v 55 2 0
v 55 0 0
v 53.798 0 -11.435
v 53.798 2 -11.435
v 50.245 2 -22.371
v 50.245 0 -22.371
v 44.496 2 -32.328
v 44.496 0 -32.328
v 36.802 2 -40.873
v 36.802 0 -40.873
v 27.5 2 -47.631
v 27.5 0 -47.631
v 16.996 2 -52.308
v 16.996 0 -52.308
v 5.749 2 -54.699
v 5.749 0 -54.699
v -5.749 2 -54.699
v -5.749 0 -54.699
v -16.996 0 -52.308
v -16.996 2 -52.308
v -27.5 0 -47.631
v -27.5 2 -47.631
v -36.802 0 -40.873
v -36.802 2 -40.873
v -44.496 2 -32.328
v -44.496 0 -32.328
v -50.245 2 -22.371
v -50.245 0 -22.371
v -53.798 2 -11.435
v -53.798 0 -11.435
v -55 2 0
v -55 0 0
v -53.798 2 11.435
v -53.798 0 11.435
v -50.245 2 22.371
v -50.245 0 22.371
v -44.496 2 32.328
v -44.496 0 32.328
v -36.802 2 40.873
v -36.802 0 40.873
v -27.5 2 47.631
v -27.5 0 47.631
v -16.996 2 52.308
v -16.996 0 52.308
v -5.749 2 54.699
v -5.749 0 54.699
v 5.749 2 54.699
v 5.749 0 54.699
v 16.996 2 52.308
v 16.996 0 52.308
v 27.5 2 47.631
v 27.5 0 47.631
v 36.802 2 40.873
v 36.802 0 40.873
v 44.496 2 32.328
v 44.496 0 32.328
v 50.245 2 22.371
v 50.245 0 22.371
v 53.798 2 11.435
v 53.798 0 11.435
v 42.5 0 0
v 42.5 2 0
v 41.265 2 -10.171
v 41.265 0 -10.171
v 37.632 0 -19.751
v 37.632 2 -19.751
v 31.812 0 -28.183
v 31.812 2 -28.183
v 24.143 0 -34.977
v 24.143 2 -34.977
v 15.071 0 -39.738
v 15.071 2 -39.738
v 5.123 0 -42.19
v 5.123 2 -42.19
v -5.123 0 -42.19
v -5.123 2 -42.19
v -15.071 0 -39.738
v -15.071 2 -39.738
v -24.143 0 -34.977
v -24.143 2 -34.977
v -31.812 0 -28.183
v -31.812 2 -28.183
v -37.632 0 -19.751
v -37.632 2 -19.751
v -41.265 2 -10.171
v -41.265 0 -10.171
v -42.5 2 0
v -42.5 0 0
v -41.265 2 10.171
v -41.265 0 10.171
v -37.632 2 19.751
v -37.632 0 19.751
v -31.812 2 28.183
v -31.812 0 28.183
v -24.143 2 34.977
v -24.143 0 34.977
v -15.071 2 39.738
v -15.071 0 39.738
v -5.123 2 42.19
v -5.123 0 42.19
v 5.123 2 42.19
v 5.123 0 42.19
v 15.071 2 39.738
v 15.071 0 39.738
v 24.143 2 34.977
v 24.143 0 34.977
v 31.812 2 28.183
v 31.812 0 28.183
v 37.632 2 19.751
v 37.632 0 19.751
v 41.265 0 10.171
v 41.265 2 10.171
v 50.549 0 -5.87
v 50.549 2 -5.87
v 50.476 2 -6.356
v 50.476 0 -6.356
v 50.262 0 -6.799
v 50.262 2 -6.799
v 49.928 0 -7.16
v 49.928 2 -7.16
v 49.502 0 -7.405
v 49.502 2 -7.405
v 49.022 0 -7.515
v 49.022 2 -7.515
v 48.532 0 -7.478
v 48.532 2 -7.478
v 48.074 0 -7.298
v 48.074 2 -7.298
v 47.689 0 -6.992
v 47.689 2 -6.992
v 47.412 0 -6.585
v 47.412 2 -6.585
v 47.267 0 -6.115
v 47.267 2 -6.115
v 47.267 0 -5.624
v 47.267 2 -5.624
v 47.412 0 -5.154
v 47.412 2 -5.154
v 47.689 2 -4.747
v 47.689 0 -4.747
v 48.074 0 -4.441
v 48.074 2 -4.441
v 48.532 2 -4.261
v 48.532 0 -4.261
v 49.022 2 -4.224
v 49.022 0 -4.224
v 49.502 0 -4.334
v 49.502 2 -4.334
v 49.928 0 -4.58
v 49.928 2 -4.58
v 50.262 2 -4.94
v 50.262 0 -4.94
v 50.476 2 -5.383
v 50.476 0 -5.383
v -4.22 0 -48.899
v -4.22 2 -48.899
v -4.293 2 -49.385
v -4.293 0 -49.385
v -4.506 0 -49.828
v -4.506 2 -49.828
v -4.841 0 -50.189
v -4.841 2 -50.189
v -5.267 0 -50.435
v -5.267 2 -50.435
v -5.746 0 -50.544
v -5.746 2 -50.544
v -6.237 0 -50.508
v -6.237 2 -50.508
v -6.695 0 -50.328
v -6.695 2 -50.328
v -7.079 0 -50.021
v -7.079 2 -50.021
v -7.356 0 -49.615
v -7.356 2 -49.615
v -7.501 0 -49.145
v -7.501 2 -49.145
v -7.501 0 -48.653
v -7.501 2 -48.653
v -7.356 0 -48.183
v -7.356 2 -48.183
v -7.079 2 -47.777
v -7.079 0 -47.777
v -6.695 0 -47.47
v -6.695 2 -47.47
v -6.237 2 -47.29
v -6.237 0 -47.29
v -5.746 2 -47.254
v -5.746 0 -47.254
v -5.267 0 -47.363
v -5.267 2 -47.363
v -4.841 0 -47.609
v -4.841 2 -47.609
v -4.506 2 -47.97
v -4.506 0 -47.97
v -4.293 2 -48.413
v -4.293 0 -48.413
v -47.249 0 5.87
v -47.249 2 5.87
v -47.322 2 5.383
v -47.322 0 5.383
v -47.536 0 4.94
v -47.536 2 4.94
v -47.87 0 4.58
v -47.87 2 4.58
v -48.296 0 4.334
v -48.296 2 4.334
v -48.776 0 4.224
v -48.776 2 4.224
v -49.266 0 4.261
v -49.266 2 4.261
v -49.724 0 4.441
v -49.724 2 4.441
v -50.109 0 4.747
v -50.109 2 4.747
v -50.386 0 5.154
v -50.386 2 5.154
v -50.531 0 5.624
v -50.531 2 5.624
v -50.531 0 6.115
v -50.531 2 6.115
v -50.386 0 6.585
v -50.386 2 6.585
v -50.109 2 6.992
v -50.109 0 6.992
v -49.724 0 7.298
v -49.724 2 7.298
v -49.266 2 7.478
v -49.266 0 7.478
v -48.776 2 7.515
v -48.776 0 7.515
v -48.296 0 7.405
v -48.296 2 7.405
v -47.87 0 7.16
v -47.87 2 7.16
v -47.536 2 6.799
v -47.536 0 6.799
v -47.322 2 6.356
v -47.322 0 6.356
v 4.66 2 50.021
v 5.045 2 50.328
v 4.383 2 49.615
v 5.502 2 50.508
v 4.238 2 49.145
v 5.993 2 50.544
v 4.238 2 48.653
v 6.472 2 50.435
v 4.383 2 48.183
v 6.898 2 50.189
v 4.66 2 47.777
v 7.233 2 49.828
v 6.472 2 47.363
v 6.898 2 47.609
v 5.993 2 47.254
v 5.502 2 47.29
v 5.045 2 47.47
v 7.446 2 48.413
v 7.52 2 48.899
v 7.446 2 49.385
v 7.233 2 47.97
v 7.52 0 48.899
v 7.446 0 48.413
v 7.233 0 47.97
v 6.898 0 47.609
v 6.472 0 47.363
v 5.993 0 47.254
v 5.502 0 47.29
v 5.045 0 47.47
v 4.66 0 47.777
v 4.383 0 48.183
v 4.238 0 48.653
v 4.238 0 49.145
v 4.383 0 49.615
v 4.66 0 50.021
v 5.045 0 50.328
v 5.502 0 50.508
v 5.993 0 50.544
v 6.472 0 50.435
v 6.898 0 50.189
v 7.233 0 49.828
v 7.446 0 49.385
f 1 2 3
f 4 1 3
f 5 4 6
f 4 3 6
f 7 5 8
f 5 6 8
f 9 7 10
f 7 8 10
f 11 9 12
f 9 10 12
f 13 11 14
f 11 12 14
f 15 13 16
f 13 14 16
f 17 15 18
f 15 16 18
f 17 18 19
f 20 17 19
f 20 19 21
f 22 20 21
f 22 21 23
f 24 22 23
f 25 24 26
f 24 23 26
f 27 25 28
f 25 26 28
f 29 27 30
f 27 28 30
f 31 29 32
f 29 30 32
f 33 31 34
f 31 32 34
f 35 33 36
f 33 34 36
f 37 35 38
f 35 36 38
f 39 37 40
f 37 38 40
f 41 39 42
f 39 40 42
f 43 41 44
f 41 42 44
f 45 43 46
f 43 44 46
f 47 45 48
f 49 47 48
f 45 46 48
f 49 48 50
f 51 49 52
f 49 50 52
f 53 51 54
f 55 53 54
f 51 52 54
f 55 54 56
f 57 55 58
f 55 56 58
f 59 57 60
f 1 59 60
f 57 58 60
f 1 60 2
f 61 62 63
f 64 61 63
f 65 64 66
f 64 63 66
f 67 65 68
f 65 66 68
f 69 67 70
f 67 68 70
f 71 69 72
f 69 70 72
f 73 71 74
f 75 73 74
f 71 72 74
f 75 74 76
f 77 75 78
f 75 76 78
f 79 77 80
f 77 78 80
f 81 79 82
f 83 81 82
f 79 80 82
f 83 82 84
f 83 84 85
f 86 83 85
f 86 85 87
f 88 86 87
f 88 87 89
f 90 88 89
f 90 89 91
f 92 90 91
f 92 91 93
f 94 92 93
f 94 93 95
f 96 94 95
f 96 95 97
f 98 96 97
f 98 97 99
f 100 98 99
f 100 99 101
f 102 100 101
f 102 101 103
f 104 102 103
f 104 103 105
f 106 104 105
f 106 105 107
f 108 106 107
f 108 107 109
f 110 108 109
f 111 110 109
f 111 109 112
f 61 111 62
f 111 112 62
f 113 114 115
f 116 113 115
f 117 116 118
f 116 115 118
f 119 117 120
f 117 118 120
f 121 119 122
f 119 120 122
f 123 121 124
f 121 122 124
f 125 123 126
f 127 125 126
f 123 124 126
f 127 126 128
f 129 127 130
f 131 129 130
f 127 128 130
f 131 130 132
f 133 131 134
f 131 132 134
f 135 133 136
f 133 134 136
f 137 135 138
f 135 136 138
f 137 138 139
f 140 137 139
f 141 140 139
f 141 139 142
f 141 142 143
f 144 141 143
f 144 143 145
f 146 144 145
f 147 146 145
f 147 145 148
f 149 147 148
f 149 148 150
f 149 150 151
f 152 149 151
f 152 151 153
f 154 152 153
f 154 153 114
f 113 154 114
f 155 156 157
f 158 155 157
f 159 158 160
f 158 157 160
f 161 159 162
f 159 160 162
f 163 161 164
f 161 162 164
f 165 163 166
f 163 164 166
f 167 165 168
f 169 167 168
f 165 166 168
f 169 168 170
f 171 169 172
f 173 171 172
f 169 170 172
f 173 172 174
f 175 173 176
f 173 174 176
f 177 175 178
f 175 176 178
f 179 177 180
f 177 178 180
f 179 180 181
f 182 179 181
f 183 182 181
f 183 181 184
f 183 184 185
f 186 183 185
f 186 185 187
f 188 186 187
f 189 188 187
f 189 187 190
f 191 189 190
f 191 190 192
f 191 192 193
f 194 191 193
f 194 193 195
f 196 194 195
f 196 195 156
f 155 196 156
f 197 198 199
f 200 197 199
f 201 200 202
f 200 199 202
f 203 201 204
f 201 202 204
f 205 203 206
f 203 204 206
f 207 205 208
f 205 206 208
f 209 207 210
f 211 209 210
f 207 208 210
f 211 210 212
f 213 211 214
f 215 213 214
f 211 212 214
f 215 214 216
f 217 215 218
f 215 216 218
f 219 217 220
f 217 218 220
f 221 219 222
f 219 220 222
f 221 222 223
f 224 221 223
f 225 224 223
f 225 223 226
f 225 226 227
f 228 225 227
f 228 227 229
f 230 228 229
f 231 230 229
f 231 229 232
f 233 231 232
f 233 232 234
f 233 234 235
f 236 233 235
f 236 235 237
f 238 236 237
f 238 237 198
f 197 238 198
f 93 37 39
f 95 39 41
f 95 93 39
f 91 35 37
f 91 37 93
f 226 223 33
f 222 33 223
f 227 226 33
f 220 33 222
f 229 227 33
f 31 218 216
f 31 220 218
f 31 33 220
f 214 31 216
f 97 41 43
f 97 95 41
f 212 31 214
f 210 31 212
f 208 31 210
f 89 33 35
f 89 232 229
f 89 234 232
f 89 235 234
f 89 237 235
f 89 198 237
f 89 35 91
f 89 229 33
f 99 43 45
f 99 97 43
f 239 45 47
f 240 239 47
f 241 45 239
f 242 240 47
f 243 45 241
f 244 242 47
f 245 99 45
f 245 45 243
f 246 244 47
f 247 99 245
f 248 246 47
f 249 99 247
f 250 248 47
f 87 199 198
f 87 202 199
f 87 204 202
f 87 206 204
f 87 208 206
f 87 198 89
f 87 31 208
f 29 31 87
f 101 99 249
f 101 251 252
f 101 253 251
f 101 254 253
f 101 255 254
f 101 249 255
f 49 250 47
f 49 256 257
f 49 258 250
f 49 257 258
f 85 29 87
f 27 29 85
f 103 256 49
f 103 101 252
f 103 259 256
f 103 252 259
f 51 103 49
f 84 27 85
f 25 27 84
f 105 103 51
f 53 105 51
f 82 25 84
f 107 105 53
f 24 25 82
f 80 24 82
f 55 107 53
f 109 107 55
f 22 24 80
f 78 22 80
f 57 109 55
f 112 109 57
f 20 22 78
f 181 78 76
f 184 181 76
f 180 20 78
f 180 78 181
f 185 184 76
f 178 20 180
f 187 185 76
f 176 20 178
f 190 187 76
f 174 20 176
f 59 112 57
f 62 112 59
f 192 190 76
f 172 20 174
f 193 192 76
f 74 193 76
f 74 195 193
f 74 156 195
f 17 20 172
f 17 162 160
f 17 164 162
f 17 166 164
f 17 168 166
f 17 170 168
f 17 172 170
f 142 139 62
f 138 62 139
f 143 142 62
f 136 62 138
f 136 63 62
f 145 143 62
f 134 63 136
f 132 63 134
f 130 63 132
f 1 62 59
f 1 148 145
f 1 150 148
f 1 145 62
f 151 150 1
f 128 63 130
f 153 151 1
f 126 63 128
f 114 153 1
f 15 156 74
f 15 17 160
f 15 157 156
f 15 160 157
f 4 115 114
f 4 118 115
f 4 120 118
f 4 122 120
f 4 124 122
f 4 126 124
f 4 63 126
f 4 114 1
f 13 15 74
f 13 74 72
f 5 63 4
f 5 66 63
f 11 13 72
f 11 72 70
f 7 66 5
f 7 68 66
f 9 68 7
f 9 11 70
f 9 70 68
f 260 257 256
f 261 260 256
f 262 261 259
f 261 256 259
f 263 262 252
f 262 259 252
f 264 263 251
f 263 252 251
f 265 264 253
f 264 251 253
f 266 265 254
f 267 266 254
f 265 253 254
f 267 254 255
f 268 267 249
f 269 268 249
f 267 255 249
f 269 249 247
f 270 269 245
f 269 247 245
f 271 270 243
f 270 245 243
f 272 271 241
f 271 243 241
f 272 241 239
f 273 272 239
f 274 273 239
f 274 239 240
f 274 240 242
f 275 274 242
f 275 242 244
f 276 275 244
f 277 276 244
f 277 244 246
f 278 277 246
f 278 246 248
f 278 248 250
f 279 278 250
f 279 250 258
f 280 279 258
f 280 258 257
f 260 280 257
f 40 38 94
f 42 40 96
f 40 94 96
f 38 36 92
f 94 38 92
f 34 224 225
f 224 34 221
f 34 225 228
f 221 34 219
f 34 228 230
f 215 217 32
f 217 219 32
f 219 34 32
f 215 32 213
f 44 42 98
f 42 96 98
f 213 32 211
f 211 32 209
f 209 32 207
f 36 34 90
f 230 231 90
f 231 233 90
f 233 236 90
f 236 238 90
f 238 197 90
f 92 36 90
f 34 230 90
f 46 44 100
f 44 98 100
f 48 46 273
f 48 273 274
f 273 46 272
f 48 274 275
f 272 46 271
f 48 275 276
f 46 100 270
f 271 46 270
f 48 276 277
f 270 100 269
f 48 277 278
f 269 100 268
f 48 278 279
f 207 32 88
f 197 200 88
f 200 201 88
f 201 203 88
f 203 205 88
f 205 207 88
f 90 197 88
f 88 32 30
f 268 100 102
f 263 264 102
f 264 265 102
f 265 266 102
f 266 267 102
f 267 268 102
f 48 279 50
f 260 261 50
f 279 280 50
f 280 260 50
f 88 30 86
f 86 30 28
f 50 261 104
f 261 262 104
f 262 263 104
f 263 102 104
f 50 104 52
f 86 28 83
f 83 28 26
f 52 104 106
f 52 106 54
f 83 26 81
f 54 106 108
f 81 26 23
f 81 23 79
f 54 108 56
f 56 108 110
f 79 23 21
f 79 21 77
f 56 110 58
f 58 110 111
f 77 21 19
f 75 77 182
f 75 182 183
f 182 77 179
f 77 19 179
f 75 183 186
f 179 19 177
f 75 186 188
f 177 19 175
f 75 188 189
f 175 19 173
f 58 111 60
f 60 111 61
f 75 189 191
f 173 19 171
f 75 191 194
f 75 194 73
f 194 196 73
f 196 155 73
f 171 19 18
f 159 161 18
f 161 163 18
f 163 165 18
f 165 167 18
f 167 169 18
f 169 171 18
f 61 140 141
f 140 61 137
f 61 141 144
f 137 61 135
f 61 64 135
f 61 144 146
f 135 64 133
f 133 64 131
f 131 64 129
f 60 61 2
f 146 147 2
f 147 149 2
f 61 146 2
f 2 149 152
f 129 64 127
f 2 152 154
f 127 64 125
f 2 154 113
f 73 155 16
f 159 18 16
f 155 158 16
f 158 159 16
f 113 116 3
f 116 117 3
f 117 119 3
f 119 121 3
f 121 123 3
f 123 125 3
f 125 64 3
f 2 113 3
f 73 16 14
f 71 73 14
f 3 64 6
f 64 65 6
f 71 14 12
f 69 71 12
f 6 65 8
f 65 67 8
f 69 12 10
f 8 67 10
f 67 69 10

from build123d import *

# Parameters (mm, degrees)
SKETCH_1_R          = 55
EXTRUDE_1_DEPTH     = 2
SKETCH_2_R          = 1.65
CUT_EXTRUDE_1_DEPTH = 14
SKETCH_3_R          = 42.5
CUT_EXTRUDE_2_DEPTH = 14


with BuildPart() as part:
    # 草图1 → 凸台-拉伸1 (new body)
    with BuildSketch(Plane(origin=(0, 0, 0), x_dir=(1, 0, 0), z_dir=(0, 1, 0))):
        Circle(SKETCH_1_R)
    extrude(amount=EXTRUDE_1_DEPTH)

    # 草图2 → 切除-拉伸1 (cut)
    with BuildSketch(Plane(origin=(0, 2, 0), x_dir=(1, 0, 0), z_dir=(0, 1, 0))):
        with Locations((-48.898985831, -5.869555746)):
            Circle(SKETCH_2_R)
        with Locations((-5.869555746, 48.898985831)):
            Circle(SKETCH_2_R)
        with Locations((48.898985831, 5.869555746)):
            Circle(SKETCH_2_R)
        with Locations((5.869555746, -48.898985831)):
            Circle(SKETCH_2_R)
    extrude(amount=-CUT_EXTRUDE_1_DEPTH, mode=Mode.SUBTRACT)

    # 草图3 → 切除-拉伸2 (cut)
    with BuildSketch(Plane(origin=(0, 2, 0), x_dir=(1, 0, 0), z_dir=(0, 1, 0))):
        Circle(SKETCH_3_R)
    extrude(amount=-CUT_EXTRUDE_2_DEPTH, mode=Mode.SUBTRACT)


solid = part.part
